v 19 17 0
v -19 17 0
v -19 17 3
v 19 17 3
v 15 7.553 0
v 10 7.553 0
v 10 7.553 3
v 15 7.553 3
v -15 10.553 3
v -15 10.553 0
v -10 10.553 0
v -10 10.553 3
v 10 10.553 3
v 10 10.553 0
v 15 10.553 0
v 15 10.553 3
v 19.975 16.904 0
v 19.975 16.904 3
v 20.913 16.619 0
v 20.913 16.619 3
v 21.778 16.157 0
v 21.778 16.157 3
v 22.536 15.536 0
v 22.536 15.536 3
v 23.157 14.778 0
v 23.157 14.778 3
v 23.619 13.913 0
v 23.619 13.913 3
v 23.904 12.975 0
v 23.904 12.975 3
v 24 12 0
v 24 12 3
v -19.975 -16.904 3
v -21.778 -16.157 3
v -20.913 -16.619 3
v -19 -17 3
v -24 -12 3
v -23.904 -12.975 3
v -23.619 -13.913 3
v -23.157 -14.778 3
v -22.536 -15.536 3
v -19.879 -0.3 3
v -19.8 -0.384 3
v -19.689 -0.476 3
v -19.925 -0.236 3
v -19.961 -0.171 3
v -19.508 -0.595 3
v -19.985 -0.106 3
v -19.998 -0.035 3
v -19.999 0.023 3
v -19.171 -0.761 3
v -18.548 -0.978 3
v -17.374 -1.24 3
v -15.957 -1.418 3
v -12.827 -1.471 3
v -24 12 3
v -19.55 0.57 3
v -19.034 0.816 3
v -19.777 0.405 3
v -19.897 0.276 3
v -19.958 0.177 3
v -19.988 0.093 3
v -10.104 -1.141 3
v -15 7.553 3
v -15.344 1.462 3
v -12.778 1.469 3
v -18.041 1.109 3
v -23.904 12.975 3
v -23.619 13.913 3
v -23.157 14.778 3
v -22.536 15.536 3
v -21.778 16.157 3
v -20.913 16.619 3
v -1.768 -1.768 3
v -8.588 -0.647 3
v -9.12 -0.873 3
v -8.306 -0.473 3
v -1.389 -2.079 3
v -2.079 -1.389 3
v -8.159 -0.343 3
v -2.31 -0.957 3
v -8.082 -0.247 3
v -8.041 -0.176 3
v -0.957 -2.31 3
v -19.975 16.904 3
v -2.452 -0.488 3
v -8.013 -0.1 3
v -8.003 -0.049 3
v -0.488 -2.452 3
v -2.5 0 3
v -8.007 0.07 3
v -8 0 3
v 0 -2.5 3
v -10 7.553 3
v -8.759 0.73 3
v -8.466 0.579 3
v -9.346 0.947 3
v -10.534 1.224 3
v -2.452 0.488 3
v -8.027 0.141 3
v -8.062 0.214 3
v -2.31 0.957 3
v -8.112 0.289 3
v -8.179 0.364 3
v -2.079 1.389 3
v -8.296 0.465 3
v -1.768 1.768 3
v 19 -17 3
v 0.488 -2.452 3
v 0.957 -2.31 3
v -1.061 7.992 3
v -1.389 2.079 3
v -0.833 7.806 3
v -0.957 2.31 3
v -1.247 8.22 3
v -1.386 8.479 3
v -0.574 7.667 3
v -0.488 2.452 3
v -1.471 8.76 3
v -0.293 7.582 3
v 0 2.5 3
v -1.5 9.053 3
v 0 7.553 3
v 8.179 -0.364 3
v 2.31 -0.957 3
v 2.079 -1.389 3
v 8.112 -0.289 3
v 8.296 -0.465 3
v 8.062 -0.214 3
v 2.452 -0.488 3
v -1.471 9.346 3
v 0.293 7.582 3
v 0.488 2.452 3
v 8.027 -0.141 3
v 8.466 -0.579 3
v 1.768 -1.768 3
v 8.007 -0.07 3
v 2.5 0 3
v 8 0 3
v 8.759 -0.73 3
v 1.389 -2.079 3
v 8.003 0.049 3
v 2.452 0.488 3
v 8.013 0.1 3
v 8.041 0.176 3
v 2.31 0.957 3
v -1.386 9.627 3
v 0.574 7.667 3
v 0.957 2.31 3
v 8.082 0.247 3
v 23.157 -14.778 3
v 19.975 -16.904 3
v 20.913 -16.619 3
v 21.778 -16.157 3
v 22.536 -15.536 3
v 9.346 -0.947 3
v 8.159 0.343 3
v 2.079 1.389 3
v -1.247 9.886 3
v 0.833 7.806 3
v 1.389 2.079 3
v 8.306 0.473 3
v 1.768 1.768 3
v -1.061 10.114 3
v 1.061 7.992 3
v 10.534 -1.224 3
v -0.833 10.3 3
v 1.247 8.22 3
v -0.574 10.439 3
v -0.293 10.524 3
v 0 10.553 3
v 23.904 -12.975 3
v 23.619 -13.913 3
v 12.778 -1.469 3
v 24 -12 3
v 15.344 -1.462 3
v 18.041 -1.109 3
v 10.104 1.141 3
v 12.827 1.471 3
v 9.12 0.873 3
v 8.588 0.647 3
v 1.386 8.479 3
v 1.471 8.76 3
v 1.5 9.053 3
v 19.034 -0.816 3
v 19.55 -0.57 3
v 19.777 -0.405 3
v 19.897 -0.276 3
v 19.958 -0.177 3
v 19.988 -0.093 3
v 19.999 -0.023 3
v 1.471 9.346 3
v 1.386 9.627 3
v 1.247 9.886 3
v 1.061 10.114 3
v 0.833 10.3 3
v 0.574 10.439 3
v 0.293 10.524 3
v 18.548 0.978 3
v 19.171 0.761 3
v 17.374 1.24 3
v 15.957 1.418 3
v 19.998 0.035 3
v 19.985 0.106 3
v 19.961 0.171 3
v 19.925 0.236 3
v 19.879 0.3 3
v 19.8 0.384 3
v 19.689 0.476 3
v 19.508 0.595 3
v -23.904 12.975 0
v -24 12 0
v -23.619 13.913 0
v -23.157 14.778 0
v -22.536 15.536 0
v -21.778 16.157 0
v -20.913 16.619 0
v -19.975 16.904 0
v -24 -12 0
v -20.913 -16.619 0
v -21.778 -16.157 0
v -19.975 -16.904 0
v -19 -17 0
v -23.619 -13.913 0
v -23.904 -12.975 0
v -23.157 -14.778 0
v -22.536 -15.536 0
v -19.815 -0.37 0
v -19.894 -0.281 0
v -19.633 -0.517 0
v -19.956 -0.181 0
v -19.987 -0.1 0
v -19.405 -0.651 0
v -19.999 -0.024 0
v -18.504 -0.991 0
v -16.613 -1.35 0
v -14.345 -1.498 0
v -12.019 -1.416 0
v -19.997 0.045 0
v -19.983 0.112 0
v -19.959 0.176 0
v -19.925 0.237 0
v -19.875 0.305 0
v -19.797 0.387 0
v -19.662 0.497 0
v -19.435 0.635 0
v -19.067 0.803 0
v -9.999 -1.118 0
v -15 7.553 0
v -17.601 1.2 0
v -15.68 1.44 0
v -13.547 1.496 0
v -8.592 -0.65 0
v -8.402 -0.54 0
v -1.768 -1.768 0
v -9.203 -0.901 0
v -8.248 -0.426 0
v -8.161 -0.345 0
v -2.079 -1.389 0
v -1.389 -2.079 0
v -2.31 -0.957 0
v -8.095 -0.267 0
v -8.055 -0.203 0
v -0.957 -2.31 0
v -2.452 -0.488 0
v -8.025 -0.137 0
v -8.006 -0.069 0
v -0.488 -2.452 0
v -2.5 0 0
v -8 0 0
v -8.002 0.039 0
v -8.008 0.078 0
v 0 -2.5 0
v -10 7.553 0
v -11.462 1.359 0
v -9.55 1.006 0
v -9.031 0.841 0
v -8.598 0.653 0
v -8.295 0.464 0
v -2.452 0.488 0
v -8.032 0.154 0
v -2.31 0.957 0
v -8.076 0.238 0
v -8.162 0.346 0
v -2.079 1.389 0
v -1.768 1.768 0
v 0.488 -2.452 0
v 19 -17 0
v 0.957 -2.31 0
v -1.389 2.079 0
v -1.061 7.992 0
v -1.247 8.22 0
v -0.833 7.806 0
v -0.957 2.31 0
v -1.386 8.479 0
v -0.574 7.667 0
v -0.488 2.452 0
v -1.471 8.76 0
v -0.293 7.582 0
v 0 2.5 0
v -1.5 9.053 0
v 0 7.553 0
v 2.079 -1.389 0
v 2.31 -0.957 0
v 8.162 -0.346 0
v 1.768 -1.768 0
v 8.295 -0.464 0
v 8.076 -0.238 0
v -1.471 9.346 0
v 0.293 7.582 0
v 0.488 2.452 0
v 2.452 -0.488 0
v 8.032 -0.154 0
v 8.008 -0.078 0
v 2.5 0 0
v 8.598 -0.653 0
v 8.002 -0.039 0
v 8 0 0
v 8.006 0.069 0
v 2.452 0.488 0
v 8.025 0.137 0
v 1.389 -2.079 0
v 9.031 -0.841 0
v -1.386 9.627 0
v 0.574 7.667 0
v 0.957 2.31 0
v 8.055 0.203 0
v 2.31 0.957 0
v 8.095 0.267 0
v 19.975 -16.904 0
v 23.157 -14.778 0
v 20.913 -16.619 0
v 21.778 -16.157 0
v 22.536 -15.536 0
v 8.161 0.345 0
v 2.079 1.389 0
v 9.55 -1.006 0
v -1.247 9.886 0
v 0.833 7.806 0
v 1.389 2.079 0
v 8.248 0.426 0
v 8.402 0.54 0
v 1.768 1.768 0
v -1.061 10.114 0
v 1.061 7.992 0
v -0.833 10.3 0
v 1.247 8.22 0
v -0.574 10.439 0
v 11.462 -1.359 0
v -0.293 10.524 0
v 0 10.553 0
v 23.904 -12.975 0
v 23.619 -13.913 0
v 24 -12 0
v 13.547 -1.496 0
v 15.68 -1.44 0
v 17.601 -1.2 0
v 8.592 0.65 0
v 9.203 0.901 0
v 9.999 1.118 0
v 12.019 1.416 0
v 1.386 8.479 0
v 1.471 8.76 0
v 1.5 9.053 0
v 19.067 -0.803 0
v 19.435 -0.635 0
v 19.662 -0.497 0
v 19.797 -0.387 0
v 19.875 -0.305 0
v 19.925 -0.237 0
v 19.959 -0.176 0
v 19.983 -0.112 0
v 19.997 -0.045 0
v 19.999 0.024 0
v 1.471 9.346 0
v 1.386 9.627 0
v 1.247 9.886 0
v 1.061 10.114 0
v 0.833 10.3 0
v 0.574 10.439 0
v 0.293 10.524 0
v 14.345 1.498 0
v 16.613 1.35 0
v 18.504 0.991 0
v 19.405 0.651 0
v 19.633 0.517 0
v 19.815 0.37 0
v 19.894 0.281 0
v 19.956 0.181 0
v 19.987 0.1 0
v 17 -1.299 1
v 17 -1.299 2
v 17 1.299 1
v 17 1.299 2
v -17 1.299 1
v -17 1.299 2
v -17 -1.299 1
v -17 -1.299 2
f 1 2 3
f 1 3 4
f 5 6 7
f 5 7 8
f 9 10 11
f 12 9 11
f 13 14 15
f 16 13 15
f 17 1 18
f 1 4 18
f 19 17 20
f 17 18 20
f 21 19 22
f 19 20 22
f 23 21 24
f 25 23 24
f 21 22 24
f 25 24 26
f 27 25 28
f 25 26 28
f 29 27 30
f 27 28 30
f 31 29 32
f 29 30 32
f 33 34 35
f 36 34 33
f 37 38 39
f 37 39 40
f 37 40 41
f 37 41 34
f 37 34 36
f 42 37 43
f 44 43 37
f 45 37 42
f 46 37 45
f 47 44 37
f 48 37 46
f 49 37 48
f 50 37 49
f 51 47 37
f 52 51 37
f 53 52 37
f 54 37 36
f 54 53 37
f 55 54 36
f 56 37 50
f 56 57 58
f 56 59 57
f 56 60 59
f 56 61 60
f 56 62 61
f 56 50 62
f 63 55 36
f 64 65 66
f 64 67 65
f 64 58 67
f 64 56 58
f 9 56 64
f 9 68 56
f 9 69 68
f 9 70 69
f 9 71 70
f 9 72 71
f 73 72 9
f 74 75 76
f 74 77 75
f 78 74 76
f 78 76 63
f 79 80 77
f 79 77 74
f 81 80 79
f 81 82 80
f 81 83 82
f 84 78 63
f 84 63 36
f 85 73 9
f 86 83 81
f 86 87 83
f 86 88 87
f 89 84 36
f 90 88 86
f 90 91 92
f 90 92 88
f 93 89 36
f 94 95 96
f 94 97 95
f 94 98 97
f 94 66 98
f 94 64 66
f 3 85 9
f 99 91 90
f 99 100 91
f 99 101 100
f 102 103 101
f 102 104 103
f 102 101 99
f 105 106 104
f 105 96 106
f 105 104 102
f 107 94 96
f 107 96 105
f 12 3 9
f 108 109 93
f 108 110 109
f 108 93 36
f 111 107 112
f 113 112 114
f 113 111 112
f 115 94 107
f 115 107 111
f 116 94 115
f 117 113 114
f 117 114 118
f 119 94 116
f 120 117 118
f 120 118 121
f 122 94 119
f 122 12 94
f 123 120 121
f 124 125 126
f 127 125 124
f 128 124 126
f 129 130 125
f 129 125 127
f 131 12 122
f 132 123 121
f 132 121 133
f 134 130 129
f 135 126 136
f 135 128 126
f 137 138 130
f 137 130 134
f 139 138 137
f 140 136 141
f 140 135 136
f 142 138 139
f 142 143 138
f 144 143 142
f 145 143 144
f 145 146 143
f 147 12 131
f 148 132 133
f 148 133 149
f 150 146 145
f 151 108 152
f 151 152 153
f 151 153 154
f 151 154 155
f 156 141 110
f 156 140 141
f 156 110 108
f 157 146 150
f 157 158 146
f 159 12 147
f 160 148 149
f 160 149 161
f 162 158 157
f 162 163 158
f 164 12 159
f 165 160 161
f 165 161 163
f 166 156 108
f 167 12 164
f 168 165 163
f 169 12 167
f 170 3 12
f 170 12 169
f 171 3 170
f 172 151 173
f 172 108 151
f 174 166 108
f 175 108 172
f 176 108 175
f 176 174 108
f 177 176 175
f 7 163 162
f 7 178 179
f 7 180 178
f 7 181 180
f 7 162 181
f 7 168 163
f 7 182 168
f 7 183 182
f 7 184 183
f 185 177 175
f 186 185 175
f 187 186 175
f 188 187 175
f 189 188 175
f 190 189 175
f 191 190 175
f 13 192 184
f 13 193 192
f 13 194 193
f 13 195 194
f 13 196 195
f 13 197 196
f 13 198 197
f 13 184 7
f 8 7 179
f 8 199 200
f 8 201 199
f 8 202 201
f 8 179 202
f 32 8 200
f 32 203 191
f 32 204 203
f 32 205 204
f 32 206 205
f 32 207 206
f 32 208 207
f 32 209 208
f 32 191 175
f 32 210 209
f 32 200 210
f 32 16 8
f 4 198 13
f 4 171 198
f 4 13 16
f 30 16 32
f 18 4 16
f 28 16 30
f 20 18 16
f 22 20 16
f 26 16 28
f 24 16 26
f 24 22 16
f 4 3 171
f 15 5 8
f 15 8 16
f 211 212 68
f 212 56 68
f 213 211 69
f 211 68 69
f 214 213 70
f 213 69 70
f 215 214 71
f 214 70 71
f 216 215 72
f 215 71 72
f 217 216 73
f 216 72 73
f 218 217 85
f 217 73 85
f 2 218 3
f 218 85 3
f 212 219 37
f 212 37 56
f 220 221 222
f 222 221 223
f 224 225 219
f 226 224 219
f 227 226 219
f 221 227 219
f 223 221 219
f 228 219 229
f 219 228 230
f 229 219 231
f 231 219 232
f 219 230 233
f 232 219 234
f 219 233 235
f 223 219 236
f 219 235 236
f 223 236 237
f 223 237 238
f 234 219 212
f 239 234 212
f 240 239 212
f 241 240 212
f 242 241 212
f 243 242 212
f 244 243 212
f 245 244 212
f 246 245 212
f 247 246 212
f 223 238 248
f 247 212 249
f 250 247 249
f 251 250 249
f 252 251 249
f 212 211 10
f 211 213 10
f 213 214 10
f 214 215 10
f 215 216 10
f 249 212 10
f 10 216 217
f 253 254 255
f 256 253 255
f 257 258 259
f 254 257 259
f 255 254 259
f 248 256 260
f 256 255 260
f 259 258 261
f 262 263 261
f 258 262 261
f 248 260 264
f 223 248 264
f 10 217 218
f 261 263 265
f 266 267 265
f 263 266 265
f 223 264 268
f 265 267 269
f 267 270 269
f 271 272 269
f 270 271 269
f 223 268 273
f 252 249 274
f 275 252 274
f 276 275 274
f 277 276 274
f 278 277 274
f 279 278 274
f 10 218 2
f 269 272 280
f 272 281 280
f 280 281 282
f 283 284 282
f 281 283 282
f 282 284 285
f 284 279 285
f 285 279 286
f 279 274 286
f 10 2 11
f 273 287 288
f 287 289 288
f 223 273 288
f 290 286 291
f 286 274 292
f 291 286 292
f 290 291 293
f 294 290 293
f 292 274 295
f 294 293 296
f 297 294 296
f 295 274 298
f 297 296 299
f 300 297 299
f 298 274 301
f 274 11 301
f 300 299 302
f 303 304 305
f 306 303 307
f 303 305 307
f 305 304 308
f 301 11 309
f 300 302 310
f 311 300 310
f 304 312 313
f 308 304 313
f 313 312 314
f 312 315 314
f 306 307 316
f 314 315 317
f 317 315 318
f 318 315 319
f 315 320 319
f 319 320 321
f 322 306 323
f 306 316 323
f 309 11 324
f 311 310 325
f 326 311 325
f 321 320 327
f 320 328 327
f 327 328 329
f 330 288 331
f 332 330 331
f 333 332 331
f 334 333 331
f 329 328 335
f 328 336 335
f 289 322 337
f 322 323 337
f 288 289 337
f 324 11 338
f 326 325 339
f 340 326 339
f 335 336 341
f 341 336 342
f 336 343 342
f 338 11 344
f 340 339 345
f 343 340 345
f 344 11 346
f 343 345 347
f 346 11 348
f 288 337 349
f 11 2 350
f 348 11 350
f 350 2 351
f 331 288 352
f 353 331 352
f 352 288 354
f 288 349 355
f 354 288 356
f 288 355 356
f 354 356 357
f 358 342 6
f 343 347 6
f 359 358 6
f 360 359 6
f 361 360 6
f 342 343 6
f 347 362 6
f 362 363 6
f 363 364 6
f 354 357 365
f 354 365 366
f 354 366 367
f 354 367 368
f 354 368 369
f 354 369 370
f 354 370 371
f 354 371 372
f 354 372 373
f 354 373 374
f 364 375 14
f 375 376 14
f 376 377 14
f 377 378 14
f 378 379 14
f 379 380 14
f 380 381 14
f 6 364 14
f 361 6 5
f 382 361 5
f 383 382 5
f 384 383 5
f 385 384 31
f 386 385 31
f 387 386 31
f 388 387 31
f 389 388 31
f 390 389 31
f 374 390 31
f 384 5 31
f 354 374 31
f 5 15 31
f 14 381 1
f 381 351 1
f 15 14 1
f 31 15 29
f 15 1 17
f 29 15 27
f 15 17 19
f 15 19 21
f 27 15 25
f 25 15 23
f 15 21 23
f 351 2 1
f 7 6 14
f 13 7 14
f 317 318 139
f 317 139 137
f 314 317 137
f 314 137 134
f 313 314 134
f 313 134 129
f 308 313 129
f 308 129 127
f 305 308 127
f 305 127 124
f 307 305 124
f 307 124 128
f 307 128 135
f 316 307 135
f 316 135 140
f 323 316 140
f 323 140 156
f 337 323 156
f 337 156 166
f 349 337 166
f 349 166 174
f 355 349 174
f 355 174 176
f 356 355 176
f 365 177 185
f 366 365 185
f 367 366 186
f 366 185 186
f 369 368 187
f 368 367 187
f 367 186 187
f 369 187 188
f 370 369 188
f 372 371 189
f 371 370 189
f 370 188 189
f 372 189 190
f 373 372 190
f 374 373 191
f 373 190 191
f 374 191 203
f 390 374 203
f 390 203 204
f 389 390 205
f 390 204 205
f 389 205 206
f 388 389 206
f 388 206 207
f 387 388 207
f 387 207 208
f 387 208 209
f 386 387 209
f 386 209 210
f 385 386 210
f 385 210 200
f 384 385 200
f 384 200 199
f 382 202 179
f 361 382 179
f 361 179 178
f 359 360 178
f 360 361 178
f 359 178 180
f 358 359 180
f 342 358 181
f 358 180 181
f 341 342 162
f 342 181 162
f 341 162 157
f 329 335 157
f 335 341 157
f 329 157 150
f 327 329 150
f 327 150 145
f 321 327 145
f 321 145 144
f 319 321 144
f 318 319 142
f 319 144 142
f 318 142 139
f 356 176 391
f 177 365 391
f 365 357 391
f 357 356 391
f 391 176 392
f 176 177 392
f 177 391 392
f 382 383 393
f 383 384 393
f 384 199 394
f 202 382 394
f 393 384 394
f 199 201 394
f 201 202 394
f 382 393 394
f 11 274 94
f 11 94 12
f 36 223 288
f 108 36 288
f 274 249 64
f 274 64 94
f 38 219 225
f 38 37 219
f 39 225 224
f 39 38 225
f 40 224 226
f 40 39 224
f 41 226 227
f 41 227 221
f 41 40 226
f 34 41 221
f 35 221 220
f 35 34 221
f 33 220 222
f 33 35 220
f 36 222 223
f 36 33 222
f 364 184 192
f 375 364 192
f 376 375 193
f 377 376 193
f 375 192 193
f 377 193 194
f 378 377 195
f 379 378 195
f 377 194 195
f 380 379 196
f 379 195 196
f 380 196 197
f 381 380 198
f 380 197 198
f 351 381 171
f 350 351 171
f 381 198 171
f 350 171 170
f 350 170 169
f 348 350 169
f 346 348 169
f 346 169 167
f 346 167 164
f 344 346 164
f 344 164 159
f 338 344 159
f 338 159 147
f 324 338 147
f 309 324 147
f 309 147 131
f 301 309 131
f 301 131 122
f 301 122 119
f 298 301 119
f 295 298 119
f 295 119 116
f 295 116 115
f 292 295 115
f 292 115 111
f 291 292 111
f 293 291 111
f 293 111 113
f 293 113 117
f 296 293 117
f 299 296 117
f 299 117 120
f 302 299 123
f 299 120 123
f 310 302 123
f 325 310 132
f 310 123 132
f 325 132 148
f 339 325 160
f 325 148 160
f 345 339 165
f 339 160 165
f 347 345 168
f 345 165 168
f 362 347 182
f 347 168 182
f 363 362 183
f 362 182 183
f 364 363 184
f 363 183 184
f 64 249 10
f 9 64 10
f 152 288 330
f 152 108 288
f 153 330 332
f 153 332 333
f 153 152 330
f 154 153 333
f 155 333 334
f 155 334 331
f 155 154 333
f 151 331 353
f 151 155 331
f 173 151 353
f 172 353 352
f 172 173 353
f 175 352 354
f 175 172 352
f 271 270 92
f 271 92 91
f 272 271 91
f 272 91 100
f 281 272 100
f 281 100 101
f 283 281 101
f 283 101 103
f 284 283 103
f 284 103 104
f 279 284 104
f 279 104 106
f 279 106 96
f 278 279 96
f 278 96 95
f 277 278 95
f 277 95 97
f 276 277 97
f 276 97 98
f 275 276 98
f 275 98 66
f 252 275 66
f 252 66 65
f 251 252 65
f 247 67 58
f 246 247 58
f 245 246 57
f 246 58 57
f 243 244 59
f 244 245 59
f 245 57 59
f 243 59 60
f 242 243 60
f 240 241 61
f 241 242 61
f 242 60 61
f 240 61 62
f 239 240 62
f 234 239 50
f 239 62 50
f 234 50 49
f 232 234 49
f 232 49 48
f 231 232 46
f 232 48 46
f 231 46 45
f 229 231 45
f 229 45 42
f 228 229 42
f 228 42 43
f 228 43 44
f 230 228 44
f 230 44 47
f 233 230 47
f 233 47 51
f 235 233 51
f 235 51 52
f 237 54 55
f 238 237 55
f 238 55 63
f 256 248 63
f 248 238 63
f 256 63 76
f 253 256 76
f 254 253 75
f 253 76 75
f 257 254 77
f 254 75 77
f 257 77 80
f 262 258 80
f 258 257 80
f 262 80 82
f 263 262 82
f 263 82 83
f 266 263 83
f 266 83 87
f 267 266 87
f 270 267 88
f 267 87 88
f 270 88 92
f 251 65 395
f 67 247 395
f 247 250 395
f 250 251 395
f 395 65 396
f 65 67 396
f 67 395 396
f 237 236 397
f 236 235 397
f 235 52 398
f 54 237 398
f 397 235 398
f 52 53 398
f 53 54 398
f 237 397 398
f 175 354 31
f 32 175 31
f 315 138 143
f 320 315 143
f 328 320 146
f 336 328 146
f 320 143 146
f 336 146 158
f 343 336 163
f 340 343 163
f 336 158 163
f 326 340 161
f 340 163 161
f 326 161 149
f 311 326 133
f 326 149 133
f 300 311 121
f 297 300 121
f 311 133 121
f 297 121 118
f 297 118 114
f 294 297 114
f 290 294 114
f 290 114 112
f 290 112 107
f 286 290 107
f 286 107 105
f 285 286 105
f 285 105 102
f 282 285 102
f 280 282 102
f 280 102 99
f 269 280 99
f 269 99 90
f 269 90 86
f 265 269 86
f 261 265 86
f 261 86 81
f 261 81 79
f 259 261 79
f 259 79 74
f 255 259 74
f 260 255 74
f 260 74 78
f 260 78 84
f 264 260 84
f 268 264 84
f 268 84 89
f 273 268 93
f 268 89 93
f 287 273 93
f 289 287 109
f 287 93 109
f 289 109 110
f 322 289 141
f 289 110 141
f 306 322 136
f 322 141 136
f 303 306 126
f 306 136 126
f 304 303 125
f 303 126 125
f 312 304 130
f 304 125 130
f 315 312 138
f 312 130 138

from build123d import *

# Parameters (mm, degrees)
F0_W     = 48
F0_H     = 34
F0_W_2   = 5
F0_H_2   = 3
F1_DEPTH = 3
F3_DEPTH = 25
F4_R     = 1.5
F5_DEPTH = 25
F6_R     = 2.5
F7_DEPTH = 25
F8_R     = 5


with BuildPart() as f1:
    # F0 (on Top) → F1 (new body)
    with BuildSketch(Plane.XY):
        Rectangle(F0_W, F0_H)
        with Locations((-12.5, 9.053119)):
            Rectangle(F0_W_2, F0_H_2, mode=Mode.SUBTRACT)
        with Locations((12.5, 9.053119)):
            Rectangle(F0_W_2, F0_H_2, mode=Mode.SUBTRACT)
    extrude(amount=F1_DEPTH)

    # F2 (on face) → F3 (cut)
    with BuildSketch(Plane.XY.offset(3)):
        with BuildLine():
            add(Edge.make_bspline(
                [(-8, 0), (-8, 2.598076), (-17, 1.299038), (-26, 0), (-17, -1.299038), (-8, -2.598076), (-8, 0)],
                knots=[0, 0, 0, 2.094395, 2.094395, 4.18879, 4.18879, 6.283185, 6.283185, 6.283185], degree=2, weights=[1, 0.5, 1, 0.5, 1, 0.5, 1]))
        make_face()
        with BuildLine():
            add(Edge.make_bspline(
                [(8, 0), (8, -2.598076), (17, -1.299038), (26, 0), (17, 1.299038), (8, 2.598076), (8, 0)],
                knots=[0, 0, 0, 2.094395, 2.094395, 4.18879, 4.18879, 6.283185, 6.283185, 6.283185], degree=2, weights=[1, 0.5, 1, 0.5, 1, 0.5, 1]))
        make_face()
    extrude(amount=-F3_DEPTH, mode=Mode.SUBTRACT)

    # F4 (on face) → F5 (cut)
    with BuildSketch(Plane.XY.offset(3)):
        with Locations((0, 9.053119)):
            Circle(F4_R)
    extrude(amount=-F5_DEPTH, mode=Mode.SUBTRACT)

    # F6 (on face) → F7 (cut)
    with BuildSketch(Plane.XY.offset(3)):
        Circle(F6_R)
    extrude(amount=-F7_DEPTH, mode=Mode.SUBTRACT)

    # F8
    f8_edges = [f1.edges().sort_by_distance(p)[0] for p in [
        (-24, 17, 1.5),
        (24, 17, 1.5),
        (24, -17, 1.5),
        (-24, -17, 1.5),
    ]]
    fillet(f8_edges, radius=F8_R)


solid = f1.part
